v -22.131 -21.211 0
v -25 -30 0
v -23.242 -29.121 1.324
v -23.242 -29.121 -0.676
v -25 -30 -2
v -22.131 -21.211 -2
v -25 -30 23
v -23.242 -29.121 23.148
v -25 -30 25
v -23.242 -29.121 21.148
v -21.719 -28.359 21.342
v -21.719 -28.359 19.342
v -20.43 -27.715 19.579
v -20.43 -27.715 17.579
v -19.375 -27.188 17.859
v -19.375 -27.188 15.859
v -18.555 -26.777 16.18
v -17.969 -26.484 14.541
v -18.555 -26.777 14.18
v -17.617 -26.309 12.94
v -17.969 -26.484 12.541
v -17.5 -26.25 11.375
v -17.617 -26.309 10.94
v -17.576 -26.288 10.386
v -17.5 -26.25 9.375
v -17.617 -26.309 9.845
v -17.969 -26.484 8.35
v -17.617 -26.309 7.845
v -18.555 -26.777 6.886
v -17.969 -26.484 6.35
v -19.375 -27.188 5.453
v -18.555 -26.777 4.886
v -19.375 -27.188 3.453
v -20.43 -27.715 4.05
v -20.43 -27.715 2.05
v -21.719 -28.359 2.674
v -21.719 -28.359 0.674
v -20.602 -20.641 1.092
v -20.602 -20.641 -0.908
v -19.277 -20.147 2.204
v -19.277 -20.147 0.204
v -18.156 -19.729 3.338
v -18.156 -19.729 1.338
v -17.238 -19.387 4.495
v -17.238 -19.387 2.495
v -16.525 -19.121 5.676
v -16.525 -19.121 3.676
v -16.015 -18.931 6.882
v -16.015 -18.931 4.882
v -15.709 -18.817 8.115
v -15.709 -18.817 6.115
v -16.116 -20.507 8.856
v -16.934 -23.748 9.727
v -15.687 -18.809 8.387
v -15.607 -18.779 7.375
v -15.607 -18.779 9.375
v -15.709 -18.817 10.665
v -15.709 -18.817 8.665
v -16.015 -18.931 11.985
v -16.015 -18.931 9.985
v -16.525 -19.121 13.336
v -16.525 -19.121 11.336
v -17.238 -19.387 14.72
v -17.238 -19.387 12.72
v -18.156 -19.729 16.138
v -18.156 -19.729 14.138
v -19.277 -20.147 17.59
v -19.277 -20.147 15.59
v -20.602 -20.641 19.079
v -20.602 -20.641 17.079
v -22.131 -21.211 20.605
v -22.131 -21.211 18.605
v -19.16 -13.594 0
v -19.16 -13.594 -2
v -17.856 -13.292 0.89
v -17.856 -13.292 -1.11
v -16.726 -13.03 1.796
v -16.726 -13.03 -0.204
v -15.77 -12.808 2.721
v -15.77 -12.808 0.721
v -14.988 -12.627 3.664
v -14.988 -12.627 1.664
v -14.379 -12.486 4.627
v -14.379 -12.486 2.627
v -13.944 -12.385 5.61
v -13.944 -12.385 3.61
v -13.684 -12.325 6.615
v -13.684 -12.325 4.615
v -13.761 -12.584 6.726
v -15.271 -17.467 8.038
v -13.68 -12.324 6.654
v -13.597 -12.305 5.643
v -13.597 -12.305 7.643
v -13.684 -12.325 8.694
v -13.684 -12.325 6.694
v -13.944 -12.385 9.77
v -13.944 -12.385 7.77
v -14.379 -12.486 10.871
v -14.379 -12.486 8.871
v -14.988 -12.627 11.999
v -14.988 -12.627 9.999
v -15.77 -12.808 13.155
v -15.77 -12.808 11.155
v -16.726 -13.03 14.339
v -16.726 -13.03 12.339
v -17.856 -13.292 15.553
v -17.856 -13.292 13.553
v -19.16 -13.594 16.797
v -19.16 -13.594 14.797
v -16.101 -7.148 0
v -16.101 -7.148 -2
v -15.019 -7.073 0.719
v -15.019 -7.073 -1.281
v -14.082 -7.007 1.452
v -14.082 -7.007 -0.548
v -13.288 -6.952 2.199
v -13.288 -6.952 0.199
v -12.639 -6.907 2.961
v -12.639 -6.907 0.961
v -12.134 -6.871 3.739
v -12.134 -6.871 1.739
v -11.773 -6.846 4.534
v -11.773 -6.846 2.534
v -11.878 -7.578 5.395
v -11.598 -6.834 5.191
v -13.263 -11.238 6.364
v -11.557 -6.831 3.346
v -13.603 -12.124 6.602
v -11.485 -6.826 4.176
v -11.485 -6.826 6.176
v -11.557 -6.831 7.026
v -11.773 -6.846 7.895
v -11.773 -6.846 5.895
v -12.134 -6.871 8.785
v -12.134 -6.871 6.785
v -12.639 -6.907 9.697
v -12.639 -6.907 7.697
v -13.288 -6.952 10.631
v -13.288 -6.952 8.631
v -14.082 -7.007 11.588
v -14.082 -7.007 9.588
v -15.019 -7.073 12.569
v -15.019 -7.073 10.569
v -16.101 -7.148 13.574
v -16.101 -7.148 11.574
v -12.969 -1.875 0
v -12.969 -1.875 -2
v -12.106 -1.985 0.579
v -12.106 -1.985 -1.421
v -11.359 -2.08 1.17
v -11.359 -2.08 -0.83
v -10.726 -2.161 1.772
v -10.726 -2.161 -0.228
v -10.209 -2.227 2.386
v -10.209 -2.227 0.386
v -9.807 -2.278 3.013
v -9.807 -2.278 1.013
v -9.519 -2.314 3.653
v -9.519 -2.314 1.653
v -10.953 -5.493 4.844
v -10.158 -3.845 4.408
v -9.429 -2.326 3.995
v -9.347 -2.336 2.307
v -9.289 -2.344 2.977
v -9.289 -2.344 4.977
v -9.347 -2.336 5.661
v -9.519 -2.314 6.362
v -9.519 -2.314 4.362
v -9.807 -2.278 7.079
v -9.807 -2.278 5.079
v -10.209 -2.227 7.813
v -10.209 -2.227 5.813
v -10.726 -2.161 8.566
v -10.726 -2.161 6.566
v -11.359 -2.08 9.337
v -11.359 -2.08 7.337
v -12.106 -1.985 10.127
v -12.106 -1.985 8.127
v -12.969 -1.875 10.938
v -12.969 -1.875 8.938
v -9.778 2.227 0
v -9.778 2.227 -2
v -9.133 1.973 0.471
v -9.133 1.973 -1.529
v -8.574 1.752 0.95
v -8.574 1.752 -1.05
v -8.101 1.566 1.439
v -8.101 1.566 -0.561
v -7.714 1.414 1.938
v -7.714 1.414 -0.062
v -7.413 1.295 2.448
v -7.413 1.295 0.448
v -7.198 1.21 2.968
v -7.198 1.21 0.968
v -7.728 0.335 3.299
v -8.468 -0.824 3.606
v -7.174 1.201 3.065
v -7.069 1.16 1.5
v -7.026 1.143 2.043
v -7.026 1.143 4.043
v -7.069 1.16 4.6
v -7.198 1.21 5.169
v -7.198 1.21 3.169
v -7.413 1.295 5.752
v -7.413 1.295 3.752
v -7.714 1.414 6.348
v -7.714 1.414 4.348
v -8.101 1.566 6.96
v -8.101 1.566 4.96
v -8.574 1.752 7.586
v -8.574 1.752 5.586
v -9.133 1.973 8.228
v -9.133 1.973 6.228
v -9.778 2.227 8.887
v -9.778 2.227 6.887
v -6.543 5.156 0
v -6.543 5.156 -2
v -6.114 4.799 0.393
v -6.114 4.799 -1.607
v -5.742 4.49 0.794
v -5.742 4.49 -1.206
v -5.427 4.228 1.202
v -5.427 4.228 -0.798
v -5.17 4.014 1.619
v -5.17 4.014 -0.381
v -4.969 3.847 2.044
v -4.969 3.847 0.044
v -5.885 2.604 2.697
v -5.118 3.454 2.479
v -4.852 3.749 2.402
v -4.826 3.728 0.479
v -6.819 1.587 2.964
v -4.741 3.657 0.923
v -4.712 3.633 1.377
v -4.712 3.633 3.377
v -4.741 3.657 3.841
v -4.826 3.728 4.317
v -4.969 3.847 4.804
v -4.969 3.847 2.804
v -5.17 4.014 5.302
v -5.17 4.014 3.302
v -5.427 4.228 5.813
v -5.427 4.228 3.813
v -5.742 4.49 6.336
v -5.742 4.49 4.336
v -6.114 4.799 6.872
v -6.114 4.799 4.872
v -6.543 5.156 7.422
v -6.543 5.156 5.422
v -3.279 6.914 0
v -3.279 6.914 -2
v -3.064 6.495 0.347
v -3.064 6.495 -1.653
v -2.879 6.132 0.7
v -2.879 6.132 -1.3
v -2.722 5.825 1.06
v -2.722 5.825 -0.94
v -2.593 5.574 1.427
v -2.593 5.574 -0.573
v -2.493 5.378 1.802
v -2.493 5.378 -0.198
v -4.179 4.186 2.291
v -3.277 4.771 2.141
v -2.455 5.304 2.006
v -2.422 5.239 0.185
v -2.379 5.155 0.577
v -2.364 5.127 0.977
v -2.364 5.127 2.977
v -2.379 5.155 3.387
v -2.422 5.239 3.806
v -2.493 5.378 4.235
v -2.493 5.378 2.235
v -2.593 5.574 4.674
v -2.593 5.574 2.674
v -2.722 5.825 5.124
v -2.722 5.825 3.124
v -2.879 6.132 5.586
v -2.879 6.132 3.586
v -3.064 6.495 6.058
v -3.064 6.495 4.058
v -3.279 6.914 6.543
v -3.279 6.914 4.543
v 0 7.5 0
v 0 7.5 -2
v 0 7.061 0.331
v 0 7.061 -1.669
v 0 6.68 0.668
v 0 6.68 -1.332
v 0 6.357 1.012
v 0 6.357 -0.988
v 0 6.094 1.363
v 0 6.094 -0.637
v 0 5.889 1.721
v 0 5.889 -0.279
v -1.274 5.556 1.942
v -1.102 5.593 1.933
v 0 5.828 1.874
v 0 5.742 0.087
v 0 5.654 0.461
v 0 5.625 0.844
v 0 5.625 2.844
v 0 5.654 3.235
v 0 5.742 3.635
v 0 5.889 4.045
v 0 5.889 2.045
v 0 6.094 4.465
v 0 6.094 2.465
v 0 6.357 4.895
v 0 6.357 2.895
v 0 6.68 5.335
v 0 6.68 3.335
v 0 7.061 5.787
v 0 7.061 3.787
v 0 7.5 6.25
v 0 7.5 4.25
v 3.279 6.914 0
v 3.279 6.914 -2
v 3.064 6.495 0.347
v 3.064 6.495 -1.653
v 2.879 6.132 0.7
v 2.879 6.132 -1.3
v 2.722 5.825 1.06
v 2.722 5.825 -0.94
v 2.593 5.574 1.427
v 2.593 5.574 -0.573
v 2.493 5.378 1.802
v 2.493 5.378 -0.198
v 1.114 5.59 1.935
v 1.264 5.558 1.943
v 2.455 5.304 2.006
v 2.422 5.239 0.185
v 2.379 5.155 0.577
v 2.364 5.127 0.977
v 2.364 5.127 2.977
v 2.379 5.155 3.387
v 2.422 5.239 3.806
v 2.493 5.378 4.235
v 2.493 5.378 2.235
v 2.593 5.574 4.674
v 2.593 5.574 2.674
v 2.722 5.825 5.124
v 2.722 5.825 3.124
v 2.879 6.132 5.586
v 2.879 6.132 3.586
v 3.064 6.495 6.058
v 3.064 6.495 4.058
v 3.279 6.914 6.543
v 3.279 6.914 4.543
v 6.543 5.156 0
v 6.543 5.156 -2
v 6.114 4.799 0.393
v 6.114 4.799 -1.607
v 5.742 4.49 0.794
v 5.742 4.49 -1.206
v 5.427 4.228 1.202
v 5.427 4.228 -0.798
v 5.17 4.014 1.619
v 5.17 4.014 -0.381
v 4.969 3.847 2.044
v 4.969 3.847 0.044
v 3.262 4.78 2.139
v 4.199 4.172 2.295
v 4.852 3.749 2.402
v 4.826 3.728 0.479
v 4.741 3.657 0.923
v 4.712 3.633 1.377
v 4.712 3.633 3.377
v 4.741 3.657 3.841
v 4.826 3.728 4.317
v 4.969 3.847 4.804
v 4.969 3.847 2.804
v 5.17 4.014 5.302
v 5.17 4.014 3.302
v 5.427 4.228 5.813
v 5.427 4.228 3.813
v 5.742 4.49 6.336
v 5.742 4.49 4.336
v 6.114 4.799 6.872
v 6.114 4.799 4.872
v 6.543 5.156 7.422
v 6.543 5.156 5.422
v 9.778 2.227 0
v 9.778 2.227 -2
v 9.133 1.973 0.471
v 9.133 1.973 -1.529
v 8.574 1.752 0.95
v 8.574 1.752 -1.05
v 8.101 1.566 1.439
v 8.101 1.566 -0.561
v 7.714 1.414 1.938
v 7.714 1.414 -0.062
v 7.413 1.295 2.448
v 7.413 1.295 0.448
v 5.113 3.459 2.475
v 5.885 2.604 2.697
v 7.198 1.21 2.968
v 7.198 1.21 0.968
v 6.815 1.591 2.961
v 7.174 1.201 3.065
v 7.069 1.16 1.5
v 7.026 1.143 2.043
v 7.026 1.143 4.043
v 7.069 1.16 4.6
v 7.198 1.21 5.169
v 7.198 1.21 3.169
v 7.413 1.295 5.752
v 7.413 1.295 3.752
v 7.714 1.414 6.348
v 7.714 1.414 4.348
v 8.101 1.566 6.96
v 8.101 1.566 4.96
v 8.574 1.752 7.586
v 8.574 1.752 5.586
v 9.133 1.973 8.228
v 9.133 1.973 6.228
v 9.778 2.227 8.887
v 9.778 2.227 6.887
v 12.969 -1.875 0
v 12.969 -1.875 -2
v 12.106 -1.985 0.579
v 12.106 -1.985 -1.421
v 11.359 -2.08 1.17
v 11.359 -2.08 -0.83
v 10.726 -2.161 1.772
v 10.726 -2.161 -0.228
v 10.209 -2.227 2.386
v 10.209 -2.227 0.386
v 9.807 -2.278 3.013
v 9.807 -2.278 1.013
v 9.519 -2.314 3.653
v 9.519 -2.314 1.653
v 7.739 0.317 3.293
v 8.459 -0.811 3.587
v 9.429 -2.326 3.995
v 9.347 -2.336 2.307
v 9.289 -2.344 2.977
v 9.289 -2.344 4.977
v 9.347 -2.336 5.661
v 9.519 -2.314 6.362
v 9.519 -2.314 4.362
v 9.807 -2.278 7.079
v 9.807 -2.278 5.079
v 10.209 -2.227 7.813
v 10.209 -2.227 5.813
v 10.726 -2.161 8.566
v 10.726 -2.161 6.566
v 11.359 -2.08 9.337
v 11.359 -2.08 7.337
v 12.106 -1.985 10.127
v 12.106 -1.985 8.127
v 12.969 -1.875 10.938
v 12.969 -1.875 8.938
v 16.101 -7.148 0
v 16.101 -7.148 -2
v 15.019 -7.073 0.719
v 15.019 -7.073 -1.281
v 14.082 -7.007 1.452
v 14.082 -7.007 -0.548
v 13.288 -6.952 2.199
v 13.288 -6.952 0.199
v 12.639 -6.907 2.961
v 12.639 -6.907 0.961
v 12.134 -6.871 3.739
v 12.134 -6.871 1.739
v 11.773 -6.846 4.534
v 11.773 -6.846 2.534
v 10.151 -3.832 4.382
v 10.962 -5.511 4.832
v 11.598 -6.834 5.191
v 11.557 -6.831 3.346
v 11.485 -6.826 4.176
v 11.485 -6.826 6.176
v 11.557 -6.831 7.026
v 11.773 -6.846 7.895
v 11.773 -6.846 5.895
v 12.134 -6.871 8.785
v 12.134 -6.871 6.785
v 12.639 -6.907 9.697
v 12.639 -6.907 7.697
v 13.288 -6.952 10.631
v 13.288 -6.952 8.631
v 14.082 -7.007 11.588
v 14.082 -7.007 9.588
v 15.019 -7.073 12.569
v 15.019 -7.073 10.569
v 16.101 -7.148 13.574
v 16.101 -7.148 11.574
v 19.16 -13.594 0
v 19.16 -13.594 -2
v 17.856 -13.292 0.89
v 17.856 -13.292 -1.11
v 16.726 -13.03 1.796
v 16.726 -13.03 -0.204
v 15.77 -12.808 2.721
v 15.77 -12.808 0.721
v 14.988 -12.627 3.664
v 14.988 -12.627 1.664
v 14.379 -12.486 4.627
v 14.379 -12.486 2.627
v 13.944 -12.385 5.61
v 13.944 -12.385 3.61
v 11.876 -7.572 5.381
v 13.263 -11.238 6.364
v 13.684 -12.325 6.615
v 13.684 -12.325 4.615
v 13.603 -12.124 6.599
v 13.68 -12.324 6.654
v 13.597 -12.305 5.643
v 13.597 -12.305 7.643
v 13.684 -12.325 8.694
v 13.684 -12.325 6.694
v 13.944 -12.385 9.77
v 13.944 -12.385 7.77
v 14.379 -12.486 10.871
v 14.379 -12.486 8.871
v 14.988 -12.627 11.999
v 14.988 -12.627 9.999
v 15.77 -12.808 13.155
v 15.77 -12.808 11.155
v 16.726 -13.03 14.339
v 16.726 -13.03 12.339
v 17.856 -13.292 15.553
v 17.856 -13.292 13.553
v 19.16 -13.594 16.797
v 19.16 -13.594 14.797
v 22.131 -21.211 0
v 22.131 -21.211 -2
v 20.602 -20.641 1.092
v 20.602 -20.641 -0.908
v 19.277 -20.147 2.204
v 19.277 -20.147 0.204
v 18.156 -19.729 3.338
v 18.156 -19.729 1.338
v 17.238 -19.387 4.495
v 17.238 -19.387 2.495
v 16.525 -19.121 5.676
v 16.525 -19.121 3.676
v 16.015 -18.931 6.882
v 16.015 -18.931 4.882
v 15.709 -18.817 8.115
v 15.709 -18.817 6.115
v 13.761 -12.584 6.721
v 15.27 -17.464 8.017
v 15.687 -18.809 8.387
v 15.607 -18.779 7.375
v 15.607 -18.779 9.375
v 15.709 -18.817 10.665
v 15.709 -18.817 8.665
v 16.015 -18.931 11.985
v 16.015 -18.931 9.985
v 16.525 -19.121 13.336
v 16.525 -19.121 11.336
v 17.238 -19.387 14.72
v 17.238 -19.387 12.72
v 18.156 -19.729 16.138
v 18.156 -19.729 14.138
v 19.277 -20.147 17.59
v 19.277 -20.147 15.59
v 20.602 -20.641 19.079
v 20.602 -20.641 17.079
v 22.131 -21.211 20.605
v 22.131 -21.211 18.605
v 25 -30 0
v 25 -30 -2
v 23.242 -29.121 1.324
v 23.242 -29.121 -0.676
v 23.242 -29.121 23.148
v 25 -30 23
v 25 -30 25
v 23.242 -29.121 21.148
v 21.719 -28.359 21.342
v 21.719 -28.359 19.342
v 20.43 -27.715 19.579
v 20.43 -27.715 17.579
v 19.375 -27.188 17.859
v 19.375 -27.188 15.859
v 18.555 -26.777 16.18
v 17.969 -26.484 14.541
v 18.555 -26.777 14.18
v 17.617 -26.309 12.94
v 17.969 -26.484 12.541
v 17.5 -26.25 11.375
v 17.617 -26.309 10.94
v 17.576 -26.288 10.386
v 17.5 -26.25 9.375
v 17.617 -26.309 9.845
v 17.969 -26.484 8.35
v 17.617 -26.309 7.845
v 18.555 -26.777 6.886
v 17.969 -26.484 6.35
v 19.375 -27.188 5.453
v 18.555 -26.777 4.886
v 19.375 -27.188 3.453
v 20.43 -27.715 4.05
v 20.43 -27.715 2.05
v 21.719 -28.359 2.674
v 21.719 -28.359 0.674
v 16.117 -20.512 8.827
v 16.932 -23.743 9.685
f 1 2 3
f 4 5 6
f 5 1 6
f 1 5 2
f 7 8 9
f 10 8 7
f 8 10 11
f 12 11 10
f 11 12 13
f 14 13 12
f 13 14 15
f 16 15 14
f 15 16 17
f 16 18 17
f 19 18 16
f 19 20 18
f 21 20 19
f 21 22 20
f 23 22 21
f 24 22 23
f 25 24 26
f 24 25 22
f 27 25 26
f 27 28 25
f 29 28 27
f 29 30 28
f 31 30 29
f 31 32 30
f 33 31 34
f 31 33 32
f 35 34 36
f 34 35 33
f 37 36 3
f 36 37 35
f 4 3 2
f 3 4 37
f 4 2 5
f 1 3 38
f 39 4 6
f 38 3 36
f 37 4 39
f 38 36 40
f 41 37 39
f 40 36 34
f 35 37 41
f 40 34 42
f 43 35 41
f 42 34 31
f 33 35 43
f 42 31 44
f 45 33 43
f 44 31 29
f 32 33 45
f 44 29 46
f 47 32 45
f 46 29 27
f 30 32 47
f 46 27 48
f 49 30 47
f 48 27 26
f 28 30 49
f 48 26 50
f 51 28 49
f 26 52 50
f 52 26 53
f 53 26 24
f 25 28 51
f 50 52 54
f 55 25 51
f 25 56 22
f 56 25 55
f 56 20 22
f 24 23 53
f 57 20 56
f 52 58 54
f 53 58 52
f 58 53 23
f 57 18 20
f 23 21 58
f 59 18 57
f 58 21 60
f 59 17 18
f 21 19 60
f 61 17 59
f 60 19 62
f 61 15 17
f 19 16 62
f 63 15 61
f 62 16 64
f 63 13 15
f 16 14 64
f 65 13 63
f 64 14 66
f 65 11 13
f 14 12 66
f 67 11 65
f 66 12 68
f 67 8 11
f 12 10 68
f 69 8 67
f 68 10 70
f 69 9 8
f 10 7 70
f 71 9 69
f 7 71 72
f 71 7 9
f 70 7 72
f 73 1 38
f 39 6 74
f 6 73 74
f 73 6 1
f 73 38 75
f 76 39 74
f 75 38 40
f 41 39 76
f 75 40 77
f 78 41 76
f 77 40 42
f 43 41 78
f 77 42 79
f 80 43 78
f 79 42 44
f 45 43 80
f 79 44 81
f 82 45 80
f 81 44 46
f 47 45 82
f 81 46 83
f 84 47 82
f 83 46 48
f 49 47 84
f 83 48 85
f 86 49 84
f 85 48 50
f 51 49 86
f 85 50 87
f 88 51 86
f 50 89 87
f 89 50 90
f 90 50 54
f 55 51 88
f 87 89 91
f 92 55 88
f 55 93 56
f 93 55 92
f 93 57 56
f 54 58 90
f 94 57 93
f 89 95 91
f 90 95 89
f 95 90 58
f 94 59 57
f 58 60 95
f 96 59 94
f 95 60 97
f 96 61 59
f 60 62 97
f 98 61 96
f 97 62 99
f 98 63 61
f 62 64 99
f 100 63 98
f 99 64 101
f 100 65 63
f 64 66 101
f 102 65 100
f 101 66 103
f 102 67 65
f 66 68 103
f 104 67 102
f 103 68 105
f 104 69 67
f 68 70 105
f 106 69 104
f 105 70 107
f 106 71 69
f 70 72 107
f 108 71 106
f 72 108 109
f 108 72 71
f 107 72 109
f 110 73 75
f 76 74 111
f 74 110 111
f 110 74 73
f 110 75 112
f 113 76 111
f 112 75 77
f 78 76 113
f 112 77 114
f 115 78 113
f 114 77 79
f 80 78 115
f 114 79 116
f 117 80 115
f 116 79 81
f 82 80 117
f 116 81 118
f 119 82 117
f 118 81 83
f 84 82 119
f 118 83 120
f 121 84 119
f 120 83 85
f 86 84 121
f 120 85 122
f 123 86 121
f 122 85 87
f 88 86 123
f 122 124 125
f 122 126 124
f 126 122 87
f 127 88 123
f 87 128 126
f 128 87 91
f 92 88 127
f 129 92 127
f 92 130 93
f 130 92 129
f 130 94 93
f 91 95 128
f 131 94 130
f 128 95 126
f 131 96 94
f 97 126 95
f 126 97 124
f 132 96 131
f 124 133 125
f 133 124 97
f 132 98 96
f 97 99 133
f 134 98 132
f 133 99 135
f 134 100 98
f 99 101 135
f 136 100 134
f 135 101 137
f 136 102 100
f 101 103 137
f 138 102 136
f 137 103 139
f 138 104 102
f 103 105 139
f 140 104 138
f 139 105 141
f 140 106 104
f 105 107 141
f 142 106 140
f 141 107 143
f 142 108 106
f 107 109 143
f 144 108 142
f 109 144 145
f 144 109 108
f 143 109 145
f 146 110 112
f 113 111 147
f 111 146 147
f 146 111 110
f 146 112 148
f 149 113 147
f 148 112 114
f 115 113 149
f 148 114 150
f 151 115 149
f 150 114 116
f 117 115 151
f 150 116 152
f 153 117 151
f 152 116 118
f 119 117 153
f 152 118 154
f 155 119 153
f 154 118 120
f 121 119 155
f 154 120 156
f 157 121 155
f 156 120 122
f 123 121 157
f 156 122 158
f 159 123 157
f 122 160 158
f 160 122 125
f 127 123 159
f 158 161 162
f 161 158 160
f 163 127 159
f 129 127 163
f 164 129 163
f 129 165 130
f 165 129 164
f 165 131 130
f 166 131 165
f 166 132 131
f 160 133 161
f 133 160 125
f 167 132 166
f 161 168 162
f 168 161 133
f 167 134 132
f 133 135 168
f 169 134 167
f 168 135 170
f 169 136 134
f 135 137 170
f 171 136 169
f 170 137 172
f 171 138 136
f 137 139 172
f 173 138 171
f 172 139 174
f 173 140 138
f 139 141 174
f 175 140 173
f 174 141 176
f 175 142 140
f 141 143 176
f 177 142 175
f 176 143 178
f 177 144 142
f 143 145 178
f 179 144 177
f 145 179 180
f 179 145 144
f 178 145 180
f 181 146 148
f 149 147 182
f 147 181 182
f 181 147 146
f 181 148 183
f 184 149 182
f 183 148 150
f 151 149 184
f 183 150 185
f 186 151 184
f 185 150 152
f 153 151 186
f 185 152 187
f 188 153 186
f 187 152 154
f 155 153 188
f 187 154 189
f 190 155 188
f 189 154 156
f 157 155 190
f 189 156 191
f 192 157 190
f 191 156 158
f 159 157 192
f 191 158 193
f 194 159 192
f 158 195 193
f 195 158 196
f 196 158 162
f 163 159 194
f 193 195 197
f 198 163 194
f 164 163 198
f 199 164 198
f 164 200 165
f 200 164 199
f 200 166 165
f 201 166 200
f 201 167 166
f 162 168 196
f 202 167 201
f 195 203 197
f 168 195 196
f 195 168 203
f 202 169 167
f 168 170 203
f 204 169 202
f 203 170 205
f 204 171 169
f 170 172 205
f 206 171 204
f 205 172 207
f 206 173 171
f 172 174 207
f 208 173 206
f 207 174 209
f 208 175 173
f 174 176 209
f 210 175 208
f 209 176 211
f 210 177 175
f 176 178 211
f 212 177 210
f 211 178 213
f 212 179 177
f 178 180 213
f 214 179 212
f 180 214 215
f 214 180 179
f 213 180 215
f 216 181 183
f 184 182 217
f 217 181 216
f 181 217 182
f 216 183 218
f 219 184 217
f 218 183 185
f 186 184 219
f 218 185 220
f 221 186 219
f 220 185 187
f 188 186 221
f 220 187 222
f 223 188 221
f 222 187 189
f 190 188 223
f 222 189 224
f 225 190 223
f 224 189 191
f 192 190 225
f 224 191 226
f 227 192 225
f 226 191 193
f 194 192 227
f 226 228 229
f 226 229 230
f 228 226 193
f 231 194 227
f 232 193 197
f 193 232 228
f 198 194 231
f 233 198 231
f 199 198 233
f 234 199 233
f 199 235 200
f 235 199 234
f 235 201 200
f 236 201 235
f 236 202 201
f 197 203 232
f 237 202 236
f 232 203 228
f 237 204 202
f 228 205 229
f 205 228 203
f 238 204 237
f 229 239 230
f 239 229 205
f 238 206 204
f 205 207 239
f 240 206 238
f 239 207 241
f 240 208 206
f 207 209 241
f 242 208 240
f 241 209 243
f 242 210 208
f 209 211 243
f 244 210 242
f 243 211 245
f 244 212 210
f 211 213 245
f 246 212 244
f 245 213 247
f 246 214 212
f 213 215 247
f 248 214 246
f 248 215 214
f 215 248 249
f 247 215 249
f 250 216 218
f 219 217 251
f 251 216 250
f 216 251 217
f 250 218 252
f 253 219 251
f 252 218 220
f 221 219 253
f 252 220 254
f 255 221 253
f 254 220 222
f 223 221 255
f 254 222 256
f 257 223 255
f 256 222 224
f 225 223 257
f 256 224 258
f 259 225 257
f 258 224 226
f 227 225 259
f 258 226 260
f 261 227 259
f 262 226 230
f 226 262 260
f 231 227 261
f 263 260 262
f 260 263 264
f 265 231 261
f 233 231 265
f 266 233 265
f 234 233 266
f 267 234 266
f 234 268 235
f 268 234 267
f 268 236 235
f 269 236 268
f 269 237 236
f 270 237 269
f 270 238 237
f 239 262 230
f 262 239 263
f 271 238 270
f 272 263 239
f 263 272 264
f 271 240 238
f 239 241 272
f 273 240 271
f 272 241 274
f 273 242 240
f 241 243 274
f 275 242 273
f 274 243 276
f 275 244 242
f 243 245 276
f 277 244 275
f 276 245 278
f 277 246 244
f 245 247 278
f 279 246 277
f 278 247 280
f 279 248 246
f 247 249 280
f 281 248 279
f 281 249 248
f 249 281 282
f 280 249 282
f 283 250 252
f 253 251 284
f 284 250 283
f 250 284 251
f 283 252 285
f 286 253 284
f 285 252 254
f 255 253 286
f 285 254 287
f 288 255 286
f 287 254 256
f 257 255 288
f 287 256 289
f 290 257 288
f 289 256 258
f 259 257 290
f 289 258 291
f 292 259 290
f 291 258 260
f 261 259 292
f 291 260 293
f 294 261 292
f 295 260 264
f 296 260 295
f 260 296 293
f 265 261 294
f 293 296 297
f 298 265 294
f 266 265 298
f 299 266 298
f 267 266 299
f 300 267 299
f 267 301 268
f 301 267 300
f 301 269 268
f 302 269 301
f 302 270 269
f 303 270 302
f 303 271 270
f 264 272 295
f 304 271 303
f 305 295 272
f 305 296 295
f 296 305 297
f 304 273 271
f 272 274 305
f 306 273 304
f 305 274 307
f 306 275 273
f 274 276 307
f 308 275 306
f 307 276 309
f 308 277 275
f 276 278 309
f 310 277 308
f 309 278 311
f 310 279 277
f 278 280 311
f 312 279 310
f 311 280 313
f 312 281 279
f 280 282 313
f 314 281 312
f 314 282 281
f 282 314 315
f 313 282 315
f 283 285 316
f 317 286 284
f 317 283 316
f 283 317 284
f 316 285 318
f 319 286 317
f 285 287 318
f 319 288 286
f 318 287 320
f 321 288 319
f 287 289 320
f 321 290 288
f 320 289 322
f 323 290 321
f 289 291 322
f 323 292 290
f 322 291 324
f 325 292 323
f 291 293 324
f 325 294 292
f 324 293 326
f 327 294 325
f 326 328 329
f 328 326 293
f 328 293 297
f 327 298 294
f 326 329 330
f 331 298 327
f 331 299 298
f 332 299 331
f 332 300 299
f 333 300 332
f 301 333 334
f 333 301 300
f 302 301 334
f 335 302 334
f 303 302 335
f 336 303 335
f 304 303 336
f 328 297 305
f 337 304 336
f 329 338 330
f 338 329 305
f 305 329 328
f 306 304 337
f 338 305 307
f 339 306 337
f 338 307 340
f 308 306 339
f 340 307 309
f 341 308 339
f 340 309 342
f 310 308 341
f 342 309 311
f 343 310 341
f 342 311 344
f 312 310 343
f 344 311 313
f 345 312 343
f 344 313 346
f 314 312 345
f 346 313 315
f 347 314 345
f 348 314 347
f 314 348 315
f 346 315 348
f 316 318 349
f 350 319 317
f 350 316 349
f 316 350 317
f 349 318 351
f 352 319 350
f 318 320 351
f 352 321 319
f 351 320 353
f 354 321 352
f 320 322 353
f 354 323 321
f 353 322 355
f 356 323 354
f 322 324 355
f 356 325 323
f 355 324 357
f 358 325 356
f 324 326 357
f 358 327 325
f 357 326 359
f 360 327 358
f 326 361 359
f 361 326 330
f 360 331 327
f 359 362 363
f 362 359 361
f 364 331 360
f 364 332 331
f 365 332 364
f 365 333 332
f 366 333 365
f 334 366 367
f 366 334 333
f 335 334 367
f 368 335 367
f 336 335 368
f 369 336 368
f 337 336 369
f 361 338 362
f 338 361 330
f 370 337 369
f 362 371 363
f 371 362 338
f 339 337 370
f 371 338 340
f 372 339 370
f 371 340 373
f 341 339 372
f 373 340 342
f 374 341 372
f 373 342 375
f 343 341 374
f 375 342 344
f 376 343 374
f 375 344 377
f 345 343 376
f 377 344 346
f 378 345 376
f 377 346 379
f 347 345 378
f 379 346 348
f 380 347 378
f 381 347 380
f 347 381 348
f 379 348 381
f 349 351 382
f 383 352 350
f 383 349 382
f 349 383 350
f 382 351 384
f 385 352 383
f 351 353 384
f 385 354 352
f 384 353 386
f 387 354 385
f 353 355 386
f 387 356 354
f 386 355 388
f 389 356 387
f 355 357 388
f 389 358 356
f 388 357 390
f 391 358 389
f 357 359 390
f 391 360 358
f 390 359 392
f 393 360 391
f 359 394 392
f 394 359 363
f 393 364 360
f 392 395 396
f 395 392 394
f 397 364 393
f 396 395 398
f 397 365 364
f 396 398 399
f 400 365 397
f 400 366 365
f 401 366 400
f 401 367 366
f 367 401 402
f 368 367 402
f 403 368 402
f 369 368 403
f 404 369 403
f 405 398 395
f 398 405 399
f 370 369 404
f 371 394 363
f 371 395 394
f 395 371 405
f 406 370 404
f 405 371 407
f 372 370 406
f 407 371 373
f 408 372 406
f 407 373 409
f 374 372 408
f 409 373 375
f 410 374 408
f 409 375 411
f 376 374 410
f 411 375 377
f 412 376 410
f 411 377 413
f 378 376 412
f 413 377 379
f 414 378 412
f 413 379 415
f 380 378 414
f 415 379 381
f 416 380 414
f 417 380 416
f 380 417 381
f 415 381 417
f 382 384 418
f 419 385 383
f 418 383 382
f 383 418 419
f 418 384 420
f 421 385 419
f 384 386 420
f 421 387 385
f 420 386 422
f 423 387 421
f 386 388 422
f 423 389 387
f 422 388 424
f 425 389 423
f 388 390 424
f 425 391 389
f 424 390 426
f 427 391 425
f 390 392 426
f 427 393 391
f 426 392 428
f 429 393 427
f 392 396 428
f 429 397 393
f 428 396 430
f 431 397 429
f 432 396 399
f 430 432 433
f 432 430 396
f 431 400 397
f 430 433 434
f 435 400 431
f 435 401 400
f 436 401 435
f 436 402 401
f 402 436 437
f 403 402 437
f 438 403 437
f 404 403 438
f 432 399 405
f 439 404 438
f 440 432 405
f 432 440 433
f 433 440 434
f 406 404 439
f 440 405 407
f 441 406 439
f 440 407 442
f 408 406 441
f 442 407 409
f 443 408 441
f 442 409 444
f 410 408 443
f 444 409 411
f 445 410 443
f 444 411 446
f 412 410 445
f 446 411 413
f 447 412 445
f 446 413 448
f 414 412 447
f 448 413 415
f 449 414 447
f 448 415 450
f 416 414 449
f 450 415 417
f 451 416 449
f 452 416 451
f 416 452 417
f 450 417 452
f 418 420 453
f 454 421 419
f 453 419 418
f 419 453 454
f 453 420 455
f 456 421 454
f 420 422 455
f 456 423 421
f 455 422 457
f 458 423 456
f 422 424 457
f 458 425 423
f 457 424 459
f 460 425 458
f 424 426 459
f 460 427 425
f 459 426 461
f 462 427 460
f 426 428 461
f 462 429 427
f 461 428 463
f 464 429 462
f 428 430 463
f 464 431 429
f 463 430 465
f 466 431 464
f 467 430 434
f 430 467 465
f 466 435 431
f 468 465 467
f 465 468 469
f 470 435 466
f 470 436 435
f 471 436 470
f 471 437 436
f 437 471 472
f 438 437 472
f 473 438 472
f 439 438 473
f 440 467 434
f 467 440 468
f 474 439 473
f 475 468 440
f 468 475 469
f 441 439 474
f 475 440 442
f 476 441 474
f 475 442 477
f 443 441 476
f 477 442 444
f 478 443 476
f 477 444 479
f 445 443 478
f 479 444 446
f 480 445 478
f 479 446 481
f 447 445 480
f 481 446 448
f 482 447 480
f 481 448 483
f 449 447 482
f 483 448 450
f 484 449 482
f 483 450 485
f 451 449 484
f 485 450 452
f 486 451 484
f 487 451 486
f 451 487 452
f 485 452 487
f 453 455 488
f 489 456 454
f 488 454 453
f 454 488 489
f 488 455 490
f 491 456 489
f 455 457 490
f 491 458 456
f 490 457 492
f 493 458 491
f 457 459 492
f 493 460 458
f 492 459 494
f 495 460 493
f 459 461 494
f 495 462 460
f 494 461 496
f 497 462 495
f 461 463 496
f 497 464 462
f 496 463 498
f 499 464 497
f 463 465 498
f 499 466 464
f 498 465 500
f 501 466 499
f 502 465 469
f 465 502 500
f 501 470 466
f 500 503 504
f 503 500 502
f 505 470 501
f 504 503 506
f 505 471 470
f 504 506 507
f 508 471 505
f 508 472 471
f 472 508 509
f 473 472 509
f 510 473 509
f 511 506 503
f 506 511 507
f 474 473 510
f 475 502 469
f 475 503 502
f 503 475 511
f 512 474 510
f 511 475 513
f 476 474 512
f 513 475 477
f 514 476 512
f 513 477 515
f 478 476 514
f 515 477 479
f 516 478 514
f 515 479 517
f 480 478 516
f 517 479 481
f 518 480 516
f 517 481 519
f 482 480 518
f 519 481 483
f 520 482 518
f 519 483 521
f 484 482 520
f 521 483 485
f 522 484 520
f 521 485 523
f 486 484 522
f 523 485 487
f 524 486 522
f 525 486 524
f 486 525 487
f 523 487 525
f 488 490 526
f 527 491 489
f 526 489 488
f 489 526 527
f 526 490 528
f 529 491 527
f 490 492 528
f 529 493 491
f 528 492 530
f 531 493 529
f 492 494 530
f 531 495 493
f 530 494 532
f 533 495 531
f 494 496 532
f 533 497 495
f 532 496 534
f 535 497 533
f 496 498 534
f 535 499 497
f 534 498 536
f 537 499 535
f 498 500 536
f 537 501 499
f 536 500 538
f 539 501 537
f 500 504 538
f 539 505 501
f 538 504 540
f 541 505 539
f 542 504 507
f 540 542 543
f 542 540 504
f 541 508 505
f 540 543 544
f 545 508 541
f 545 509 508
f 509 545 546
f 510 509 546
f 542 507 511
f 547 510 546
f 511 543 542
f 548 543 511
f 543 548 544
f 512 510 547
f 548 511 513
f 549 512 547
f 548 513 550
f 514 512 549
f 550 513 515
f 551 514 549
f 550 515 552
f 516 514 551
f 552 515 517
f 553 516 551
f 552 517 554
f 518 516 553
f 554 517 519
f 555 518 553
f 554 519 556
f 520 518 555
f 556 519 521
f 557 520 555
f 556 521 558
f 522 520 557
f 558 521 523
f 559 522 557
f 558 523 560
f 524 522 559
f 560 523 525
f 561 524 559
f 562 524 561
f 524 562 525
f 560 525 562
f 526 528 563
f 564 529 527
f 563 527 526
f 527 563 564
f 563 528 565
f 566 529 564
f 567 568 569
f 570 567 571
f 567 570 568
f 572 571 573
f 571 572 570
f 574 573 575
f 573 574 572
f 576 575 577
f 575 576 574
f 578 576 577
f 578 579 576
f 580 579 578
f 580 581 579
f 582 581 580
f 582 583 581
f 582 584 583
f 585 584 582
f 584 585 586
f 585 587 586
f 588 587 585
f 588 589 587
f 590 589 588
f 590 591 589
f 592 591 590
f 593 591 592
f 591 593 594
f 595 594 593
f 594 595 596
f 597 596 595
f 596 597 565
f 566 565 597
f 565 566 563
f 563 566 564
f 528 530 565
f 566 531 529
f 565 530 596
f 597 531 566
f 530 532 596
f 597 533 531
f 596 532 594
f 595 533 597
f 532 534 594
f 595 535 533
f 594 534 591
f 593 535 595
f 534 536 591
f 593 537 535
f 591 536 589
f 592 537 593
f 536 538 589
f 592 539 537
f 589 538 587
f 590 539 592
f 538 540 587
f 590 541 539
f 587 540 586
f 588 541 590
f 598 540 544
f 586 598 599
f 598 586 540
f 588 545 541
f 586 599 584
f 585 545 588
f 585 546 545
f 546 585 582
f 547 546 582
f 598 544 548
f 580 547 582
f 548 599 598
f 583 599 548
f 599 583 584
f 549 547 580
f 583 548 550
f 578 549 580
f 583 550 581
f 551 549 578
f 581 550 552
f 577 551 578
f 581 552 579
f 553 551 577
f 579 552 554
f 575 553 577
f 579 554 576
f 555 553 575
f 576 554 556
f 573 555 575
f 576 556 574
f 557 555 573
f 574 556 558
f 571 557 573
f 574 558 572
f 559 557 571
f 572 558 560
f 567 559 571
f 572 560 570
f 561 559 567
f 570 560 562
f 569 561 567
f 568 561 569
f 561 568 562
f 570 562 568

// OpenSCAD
// file: bezier.scad
//=====================================
// This is public Domain Code
// Contributed by: William A Adams
// 25 May 2011
//=====================================


//=======================================
//
//			 Functions
//
//=======================================

/*
	Bernstein Basis Functions

	For Bezier curves, these functions give the weights per control point.
	
*/
function BEZ03(u) = pow((1-u), 3);
function BEZ13(u) = 3*u*(pow((1-u),2));
function BEZ23(u) = 3*(pow(u,2))*(1-u);
function BEZ33(u) = pow(u,3);


// Calculate a singe point along a cubic bezier curve
// Given a set of 4 control points, and a parameter 0 <= 'u' <= 1
// These functions will return the exact point on the curve
function PtOnBez2D(p0, p1, p2, p3, u) = [
	BEZ03(u)*p0[0]+BEZ13(u)*p1[0]+BEZ23(u)*p2[0]+BEZ33(u)*p3[0],
	BEZ03(u)*p0[1]+BEZ13(u)*p1[1]+BEZ23(u)*p2[1]+BEZ33(u)*p3[1]];

// Given an array of control points
function PtOnBez(cps, u) = 
	[BEZ03(u)*cps[0][0]+BEZ13(u)*cps[1][0]+BEZ23(u)*cps[2][0]+BEZ33(u)*cps[3][0],
	BEZ03(u)*cps[0][1]+BEZ13(u)*cps[1][1]+BEZ23(u)*cps[2][1]+BEZ33(u)*cps[3][1],
	BEZ03(u)*cps[0][2]+BEZ13(u)*cps[1][2]+BEZ23(u)*cps[2][2]+BEZ33(u)*cps[3][2]];

// Calculate a point on a Bezier mesh
// Given the mesh, and the parametric 'u', and 'v' values
function PtOnBezMesh(mesh, uv) = PtOnBez(
	[PtOnBez(mesh[0], uv[0]), PtOnBez(mesh[1], uv[0]),
	PtOnBez(mesh[2], uv[0]), PtOnBez(mesh[3], uv[0])], 
	uv[1]);

// Given a mesh of control points, and an array that contains the 
// row and column of the quad we want, return the quad as an 
// ordered set of points.  The winding will be counter clockwise
function GetControlQuad(mesh, rc) = [ 
	mesh[rc[0]+1][rc[1]], 
	mesh[rc[0]][rc[1]], 
	mesh[rc[0]][rc[1]+1], 
	mesh[rc[0]+1][rc[1]+1]
];


// Given a mesh, and the 4 parametric points, return a quad that has the appropriate 
// points along the curve, in counter clockwise order
function GetCurveQuad(mesh, u1v1, u2v2) = [
	PtOnBezMesh(mesh, [u1v1[0],u2v2[1]]), 
	PtOnBezMesh(mesh, u1v1),
	PtOnBezMesh(mesh, [u2v2[0],u1v1[1]]), 
	PtOnBezMesh(mesh, u2v2)];
// file: maths.scad
//===================================== 
// This is public Domain Code
// Contributed by: William A Adams
// May 2011
//=====================================

/*
	A set of math routines for graphics calculations

	There are many sources to draw from to create the various math
	routines required to support a graphics library.  The routines here
	were created from scratch, not borrowed from any particular 
	library already in existance.

	One great source for inspiration is the book:
		Geometric Modeling
		Author: Michael E. Mortenson

	This book has many great explanations about the hows and whys
	of geometry as it applies to modeling.

	As this file may accumulate quite a lot of routines, you can either
	include it whole in your OpenScad files, or you can choose to 
	copy/paste portions that are relevant to your particular situation.

	It is public domain code, simply to avoid any licensing issues.
*/

//=======================================
//				Constants
//=======================================
CGoldenRatio = 1.618; 

//=======================================
//
// 				Point Routines
//
//=======================================

// Create a point
function Point2D_Create(u,v) = [u,v]; 
function Point3D_Create(u,v,w) = [u,v,w];

//=======================================
//
// 				Vector Routines
//
//=======================================

// Basic vector routines
// Sum of two vectors
function VSUM(v1, v2) = [v1[0]+v2[0], v1[1]+v2[1], v1[2]+v2[2]];
function VSUB(v1, v2) = [v1[0]-v2[0], v1[1]-v2[1], v1[2]-v2[2]];

function VMULT(v1, v2) = [v1[0]*v2[0], v1[1]*v2[1], v1[2]*v2[2]];

// Magnitude of a vector
// Gives the Euclidean norm
function VLENSQR(v) = (v[0]*v[0]+v[1]*v[1]+v[2]*v[2]);
function VLEN(v) = sqrt(VLENSQR(v));
function VMAG(v) = sqrt(v[0]*v[0]+v[1]*v[1]+v[2]*v[2]);


// Returns the unit vector associated with a vector
function VUNIT(v) = v/VMAG(v);
function VNORM(v) = v/VMAG(v);

// The scalar, or 'dot' product
// law of cosines
// if VDOT(v1,v2) == 0, they are perpendicular
function SPROD(v1,v2) = v1[0]*v2[0]+v1[1]*v2[1]+v1[2]*v2[2];
function VDOT(v1v2) = SPROD(v1v2[0], v1v2[1]);

// The vector, or Cross product
// Given an array that contains two vectors
function VPROD(vs) = [
	(vs[0][1]*vs[1][2])-(vs[1][1]*vs[0][2]), 
	(vs[0][2]*vs[1][0])-(vs[1][2]*vs[0][0]),
	(vs[0][0]*vs[1][1])-(vs[1][0]*vs[0][1])];
function VCROSS(v1, v2) = VPROD([v1,v2]);

// Calculate the angle between two vectors
function VANG(v1, v2) = acos(VDOT([v1,v2])/(VMAG(v1)*VMAG(v2)));

// Calculate the rotations necessary to take a polygon, and apply 
// the rotate() transform, and get the polygon to be perpendicular to 
// the specified vector.
function rotations(v) = [ 
	VANG([0,1,0], [0,v[1],v[2]]), 
	VANG([0,0,-1], [v[0],0,v[2]]), 
	VANG([1,0,0], [v[0], v[1],0])];

// Get the appropriate rotations to place a cylinder in world space 
// This is helpful when trying to place a 'line segment' in space
// Book: Essential Mathematics for Games and Interactive Applications (p.75)
function LineRotations(v) = [
	atan2(sqrt(v[0]*v[0]+v[1]*v[1]), v[2]), 
	0, 
	atan2(v[1], v[0])+90];

// The following are already provided in OpenScad, but are
// here for completeness
function VMULTS(v, s) = [v[0]*s, v[1]*s, v[2]*s];
function VDIVS(v,s) = [v[0]/s, v[1]/s, v[2]/s];
function VADDS(v,s) = [v[0]+s, v[1]+s, v[2]+s];
function VSUBS(v,s) = [v[0]-s, v[1]-s, v[2]-s];


// Some more convenience routines.  Not found in OpenScad, but primarily using OpenScad routines
function VMIN(v1,v2) = [min(v1[0],v2[0]), min(v1[1],v2[1]), min(v1[2], v2[2])];
function VMIN3(v1, v2, v3) = VMIN(VMIN(v1,v2),v3);
function VMIN4(v1, v2, v3, v4) = VMIN(VMIN3(v1, v2, v3), v4);

function VMAX(v1,v2) = [max(v1[0],v2[0]), max(v1[1],v2[1]), max(v1[2], v2[2])];
function VMAX3(v1, v2, v3) = VMAX(VMAX(v1,v2),v3);
function VMAX4(v1, v2, v3, v4) = VMAX(VMAX(v1, v2, v3), v4);


//=======================================
//
// 			MATRIX Routines
//
//=======================================

function MADD2X2(m1, m2) = [
	[m1[0][0]+m2[0][0],  m1[0][1]+m2[0][1]],
	[m1[1][2]+m2[1][0],  m1[1][1]+m2[1][1]]];

// Returns the determinant of a 2X2 matrix
// Matrix specified in row major order
function DETVAL2X2(m) = m[0[0]]*m[1[1]] - m[0[1]]*m[1[0]];

// Returns the determinant of a 3X3 matrix
function DETVAL(m) = 
	m[0[0]]*DETVAL2X2([ [m[1[1]],m[1[2]]], [m[2[1]],m[2[2]]] ]) - 
	m[0[1]]*DETVAL2X2([ [m[1[0]],m[1[2]]], [m[2[0]],m[2[2]]] ]) + 
	m[0[2]]*DETVAL2X2([ [m[1[0]],m[1[1]]], [m[2[0]],m[2[1]]] ]);

//=======================================
//
// 			Helper Routines
//
//=======================================

function AvgThree(v1,v2,v3) = (v1+v2+v3)/3; 
function AvgFour(v1,v2,v3,v4) = (v1+v2+v3+v4)/4;

function CenterOfGravity3(p0, p1, p2) = [
	AvgThree(p0[0], p1[0], p2[0]), 
	AvgThree(p0[1], p1[1], p2[1]), 
	AvgThree(p0[2], p1[2], p2[2])];
function CenterOfGravity4(p0, p1, p2, p3) = [
	AvgThree(p0[0], p1[0], p2[0], p3[0]), 
	AvgThree(p0[1], p1[1], p2[1], p3[1]), 
	AvgThree(p0[2], p1[2], p2[2], p3[2])];

function lerp1(u, p0, p1) = (1-u)*p0 + u*p1;
function lerp(u, v1, v2) = [
	lerp1(u, v1[0], v2[0]),
	lerp1(u, v1[1], v2[2]),
	lerp1(u, v1[2], v2[2])
	];

 
// file: Renderer.scad
//===================================== 
// This is public Domain Code
// Contributed by: William A Adams
// 14 May 2011
//=====================================

include <maths.scad>
include <bezier.scad>


//=========================================
//
// 			Functions
//
//=========================================

function parseSeg(seg) = [ 
	seg[0], 
	LineRotations(seg[1]-seg[0]), 
	VMAG(seg[1]-seg[0])
	];

function GetPlaneVectors(points) = [points[2]-points[1],points[0]-points[1]];

//function LineRotations(v) = [ 
//	atan2(sqrt(v[0]*v[0]+v[1]*v[1]), v[2]), 
//	0, 
//	atan2(v[1], v[0])+90];

function quadtrans(quad, trans) = [ 
	VSUM(quad[0], trans), 
	VSUM(quad[1], trans),
	VSUM(quad[2], trans),
	VSUM(quad[3], trans)];

//=========================================
//
// 			Modules
//
//=========================================
module PlaceLine(seg, radius=0.025) 
{
	params = parseSeg(seg);

//echo("Segment: ", params,r);

	origin = params[0];
	rot = params[1];
	len = params[2];

//echo("ORIGIN ", params[0]);
//echo("ROTATION: ", rot);
//echo("LENGTH: ",len);

	translate(origin)
	rotate(rot)
	cylinder(r=radius, h=len, $fn=12);
}

// Display a polyhedron with some thickness 
module DisplayTriShard(shard)
{
polyhedron(
points=[
shard[0][0], shard[0][1],shard[0][2], // Top
shard[1][0], shard[1][1], shard[1][2]], // Bottom
triangles=[
[0,2,1],
[3,4,5],
[1,5,4],
[1,2,5],
[2,3,5],
[2,0,3],
[0,4,3],
[0,1,4]
]);
}

module DisplayQuadShard(quad, thickness=1) 
{
	lowquad = quadtrans(quad, [0,0,-thickness]);
//echo("QUAD: ", quad);
//echo("LOW QUAD: ", lowquad);

	DisplayTriShard([[quad[0],quad[1],quad[2]],
		[lowquad[0], lowquad[1], lowquad[2]]]);

	DisplayTriShard([[quad[0],quad[2],quad[3]],
		[lowquad[0], lowquad[2], lowquad[3]]]);
}

//========================================
//		Bezier Display Routines
//========================================

// This function will extrude a bezier solid from a bezier curve 
// It is a straight up prism
// c - ControlPoints
//
module BezFillet(c, focalPoint, steps=gSteps, height=gHeight)
{
	for(step = [steps:1])
	{
		linear_extrude(height = height, convexity = 10) 
		polygon(
			points=[
				focalPoint,
				PtOnBez2D(c[0], c[1], c[2],c[3], step/steps),
				PtOnBez2D(c[0], c[1], c[2],c[3], (step-1)/steps)],
			paths=[[0,1,2,0]]
		);
	}
}

module BezCubicFilletColored(c, focalPoint, steps=gSteps, height=gHeight, colors)
{
	for(step = [steps:1])
	{
		color(PointOnBezCubic3D(colors[0], colors[1], colors[2], colors[3], step/steps))
		linear_extrude(height = height, convexity = 10) 
		polygon(
		points=[
		focalPoint,
		PointOnBezCubic2D(c[0], c[1], c[2],c[3], step/steps),
		PointOnBezCubic2D(c[0], c[1], c[2],c[3], (step-1)/steps)],
		paths=[[0,1,2,0]]
		);
	}
}


module BezCubicRibbon(c1, c2, steps=gSteps, height=gHeight, colors=[[1,0,0],[1,1,0],[0,1,1],[0,0,1]])
{
for (step=[0:steps-1])
{
color(PointOnBezCubic3D(colors[0], colors[1], colors[2], colors[3], step/steps))
linear_extrude(height = height, convexity = 10) 
polygon(
points=[
PtOnBez2D(c1[0], c1[1], c1[2],c1[3], step/steps),
PtOnBez2D(c2[0], c2[1], c2[2],c2[3], (step)/steps),
PtOnBez2D(c2[0], c2[1], c2[2],c2[3], (step+1)/steps),
PtOnBez2D(c1[0], c1[1], c1[2],c1[3], (step+1)/steps)],
paths=[[0,1,2,3]]
);

}
}

module BezCubicRibbonRotate(c1, c2, steps=gSteps, height=gHeight, colors=[[1,0,0],[1,1,0],[0,1,1],[0,0,1]])
{
for (step=[0:steps-1])
{
color(PointOnBezCubic3D(colors[0], colors[1], colors[2], colors[3], step/steps))
rotate_extrude(convexity=10) 
polygon(
points=[
PtOnBez2D(c1[0], c1[1], c1[2],c1[3], step/steps),
PtOnBez2D(c2[0], c2[1], c2[2],c2[3], (step)/steps),
PtOnBez2D(c2[0], c2[1], c2[2],c2[3], (step+1)/steps),
PtOnBez2D(c1[0], c1[1], c1[2],c1[3], (step+1)/steps)],
paths=[[0,1,2,3]]
);
}
}


module bezierMesh(mesh,
	colors=[[1,1,0],[1,1,0],[1,1,0],[1,1,0]], 
	usteps=4, wsteps=4)
{
	for (ustep = [0:usteps-1]) 
	{
		for (wstep=[0:wsteps-1])
		{
			assign(ufrac1 = ustep/usteps)
			assign(ufrac2 = (ustep+1)/usteps)
			assign(wfrac1=wstep/wsteps)
			assign(wfrac2=(wstep+1)/wsteps)
			assign(quad = GetCurveQuad(mesh, [ufrac1,wfrac1], [ufrac2,wfrac2]))
			{
//echo("FRACTIONS U1,V1: ", ufrac1, vfrac1);
//echo("FRACTIONS U2,V2: ", ufrac2, vfrac2);
//echo("QUAD: ", quad);
			
				PlaceQuad(quad);
			}
		}
	}
}

module DisplayBezSurface(mesh, 
	colors=[[1,0,0],[1,1,0],[0,1,1],[0,0,1]], 
	steps=4, thickness=1)
{
	for (ustep = [0:steps-1])
	{
		for (vstep=[0:steps-1])
		{
			assign(ufrac1 = ustep/steps)
			assign(ufrac2 = (ustep+1)/steps)
			assign(vfrac1=vstep/steps)
			assign(vfrac2=(vstep+1)/steps)
			assign(quad = GetCurveQuad(mesh, [ufrac1,vfrac1], [ufrac2,vfrac2]))
			{
//color([acolor[0], acolor[1], acolor[2], ufrac1/vfrac2])
				color(PtOnBez(colors, vfrac1))
				DisplayQuadShard(quad, thickness=thickness);
			}
		}
	}
}

//module bezierMeshPoints(lcp1, lcp2, lcp3, lcp4,
//	colors=[[1,1,0],[1,1,0],[1,1,],[1,1,0]], 
//	granuleSize = gGranuleSize, usteps=4, vsteps=4)
//{
//	for (ustep = [0:usteps-1])
//	{
//		assign(ufrac1 = ustep/usteps)
//		assign(ufrac2 = (ustep+1)/usteps)
//		assign(c1u1 =  PtOnBez(lcp1, ufrac1))
//		assign(c2u1 =  PtOnBez(lcp2, ufrac1))
//		assign(c3u1 =  PtOnBez(lcp3, ufrac1))
//		assign(c4u1 =  PtOnBez(lcp4, ufrac1))
//
//		assign(c1u2 =  PtOnBez(lcp1[0],lcp1[1], lcp1[2], lcp1[3], ufrac2))
//		assign(c2u2 =  PtOnBez(lcp2[0],lcp2[1], lcp2[2], lcp2[3], ufrac2))
//		assign(c3u2 =  PtOnBez(lcp3[0],lcp3[1], lcp3[2], lcp3[3], ufrac2))
//		assign(c4u2 =  PtOnBez(lcp4[0],lcp4[1], lcp4[2], lcp4[3], ufrac2))
//		{
//			for(vstep=[0:vsteps-1])
//			{
//				assign(vpt = PointOnBezCubic3D(c1u1, c2u1, c3u1, c4u1, vstep/vsteps))
//				translate(vpt)
//				sphere(r=0.75);
//			}
//		}
//	}
//}

module bezierMeshSolid(mesh,
	colors=[[1,1,0],[1,1,0],[1,1,],[1,1,0]], 
	granuleSize = [1,1,1], 
	usteps=100, vsteps=100)
{
	for (ustep = [0:usteps])
	{
		for(vstep=[0:vsteps])
		{
			assign(ufrac = ustep/usteps)
			assign(vfrac = vstep/vsteps)
			assign(vpt = PtOnBezMesh(mesh, [ufrac,vfrac]))
			{
				//echo(vpt);
				translate([vpt[0], vpt[1], vpt[2]])
				cube(size=[1,1,vpt[2]]);
			}
		}
	}
}
// main file
//===================================== 
// This is public Domain Code
// Contributed by: William A Adams
// 25 May 2011
//=====================================

include <Renderer.scad>


cp1 = [[-25, -30,0], [-10, 20,0], [10,20,0], [25,-30,0]];
cp2 = [[-15, -25,7], [-7, 15,0], [7,15,0], [15,-25,7]];
cp3 = [[-15, -25,15], [-7, 15,0], [7,15,0], [15,-25,15]];
cp4 = [[-25, -30,25], [-10, 20,0], [10,20,0], [25,-30,25]];

gcp1 = [[0,0,0], [1,-1,0], [2,-1,0], [2.5,0.5,0]]; 
gcp2 = [[0,1,1], [1,1,2], [2,1,2], [3,1,1]]; 
gcp3 = [[0,2,1], [1,2,2], [2,2,2], [3,2,1]]; 
gcp4 = [[0,3,0], [1,4,0], [2,4,0], [3,3,0]]; 



// This one does not do so well because it is 'vertical', so it folds
// on itself when doing a z-axis extrusion
// It cam be easily improved by laying out the vertices such that
// the z-axis extrusion is more clear
DisplayBezSurface([cp1,cp2,cp3,cp4], 
	colors=[[1,0,0],[1,1,0],[0,1,1],[0,0,1]],
	steps=16, thickness=2);


// This one does fine as it is mostly 'flat' with respect to the 
// x-y plane
//DisplayBezSurface([gcp1,gcp2,gcp3,gcp4], 
//	colors=[[1,0,0],[1,1,0],[0,1,1],[0,0,1]],
//	steps=16);
